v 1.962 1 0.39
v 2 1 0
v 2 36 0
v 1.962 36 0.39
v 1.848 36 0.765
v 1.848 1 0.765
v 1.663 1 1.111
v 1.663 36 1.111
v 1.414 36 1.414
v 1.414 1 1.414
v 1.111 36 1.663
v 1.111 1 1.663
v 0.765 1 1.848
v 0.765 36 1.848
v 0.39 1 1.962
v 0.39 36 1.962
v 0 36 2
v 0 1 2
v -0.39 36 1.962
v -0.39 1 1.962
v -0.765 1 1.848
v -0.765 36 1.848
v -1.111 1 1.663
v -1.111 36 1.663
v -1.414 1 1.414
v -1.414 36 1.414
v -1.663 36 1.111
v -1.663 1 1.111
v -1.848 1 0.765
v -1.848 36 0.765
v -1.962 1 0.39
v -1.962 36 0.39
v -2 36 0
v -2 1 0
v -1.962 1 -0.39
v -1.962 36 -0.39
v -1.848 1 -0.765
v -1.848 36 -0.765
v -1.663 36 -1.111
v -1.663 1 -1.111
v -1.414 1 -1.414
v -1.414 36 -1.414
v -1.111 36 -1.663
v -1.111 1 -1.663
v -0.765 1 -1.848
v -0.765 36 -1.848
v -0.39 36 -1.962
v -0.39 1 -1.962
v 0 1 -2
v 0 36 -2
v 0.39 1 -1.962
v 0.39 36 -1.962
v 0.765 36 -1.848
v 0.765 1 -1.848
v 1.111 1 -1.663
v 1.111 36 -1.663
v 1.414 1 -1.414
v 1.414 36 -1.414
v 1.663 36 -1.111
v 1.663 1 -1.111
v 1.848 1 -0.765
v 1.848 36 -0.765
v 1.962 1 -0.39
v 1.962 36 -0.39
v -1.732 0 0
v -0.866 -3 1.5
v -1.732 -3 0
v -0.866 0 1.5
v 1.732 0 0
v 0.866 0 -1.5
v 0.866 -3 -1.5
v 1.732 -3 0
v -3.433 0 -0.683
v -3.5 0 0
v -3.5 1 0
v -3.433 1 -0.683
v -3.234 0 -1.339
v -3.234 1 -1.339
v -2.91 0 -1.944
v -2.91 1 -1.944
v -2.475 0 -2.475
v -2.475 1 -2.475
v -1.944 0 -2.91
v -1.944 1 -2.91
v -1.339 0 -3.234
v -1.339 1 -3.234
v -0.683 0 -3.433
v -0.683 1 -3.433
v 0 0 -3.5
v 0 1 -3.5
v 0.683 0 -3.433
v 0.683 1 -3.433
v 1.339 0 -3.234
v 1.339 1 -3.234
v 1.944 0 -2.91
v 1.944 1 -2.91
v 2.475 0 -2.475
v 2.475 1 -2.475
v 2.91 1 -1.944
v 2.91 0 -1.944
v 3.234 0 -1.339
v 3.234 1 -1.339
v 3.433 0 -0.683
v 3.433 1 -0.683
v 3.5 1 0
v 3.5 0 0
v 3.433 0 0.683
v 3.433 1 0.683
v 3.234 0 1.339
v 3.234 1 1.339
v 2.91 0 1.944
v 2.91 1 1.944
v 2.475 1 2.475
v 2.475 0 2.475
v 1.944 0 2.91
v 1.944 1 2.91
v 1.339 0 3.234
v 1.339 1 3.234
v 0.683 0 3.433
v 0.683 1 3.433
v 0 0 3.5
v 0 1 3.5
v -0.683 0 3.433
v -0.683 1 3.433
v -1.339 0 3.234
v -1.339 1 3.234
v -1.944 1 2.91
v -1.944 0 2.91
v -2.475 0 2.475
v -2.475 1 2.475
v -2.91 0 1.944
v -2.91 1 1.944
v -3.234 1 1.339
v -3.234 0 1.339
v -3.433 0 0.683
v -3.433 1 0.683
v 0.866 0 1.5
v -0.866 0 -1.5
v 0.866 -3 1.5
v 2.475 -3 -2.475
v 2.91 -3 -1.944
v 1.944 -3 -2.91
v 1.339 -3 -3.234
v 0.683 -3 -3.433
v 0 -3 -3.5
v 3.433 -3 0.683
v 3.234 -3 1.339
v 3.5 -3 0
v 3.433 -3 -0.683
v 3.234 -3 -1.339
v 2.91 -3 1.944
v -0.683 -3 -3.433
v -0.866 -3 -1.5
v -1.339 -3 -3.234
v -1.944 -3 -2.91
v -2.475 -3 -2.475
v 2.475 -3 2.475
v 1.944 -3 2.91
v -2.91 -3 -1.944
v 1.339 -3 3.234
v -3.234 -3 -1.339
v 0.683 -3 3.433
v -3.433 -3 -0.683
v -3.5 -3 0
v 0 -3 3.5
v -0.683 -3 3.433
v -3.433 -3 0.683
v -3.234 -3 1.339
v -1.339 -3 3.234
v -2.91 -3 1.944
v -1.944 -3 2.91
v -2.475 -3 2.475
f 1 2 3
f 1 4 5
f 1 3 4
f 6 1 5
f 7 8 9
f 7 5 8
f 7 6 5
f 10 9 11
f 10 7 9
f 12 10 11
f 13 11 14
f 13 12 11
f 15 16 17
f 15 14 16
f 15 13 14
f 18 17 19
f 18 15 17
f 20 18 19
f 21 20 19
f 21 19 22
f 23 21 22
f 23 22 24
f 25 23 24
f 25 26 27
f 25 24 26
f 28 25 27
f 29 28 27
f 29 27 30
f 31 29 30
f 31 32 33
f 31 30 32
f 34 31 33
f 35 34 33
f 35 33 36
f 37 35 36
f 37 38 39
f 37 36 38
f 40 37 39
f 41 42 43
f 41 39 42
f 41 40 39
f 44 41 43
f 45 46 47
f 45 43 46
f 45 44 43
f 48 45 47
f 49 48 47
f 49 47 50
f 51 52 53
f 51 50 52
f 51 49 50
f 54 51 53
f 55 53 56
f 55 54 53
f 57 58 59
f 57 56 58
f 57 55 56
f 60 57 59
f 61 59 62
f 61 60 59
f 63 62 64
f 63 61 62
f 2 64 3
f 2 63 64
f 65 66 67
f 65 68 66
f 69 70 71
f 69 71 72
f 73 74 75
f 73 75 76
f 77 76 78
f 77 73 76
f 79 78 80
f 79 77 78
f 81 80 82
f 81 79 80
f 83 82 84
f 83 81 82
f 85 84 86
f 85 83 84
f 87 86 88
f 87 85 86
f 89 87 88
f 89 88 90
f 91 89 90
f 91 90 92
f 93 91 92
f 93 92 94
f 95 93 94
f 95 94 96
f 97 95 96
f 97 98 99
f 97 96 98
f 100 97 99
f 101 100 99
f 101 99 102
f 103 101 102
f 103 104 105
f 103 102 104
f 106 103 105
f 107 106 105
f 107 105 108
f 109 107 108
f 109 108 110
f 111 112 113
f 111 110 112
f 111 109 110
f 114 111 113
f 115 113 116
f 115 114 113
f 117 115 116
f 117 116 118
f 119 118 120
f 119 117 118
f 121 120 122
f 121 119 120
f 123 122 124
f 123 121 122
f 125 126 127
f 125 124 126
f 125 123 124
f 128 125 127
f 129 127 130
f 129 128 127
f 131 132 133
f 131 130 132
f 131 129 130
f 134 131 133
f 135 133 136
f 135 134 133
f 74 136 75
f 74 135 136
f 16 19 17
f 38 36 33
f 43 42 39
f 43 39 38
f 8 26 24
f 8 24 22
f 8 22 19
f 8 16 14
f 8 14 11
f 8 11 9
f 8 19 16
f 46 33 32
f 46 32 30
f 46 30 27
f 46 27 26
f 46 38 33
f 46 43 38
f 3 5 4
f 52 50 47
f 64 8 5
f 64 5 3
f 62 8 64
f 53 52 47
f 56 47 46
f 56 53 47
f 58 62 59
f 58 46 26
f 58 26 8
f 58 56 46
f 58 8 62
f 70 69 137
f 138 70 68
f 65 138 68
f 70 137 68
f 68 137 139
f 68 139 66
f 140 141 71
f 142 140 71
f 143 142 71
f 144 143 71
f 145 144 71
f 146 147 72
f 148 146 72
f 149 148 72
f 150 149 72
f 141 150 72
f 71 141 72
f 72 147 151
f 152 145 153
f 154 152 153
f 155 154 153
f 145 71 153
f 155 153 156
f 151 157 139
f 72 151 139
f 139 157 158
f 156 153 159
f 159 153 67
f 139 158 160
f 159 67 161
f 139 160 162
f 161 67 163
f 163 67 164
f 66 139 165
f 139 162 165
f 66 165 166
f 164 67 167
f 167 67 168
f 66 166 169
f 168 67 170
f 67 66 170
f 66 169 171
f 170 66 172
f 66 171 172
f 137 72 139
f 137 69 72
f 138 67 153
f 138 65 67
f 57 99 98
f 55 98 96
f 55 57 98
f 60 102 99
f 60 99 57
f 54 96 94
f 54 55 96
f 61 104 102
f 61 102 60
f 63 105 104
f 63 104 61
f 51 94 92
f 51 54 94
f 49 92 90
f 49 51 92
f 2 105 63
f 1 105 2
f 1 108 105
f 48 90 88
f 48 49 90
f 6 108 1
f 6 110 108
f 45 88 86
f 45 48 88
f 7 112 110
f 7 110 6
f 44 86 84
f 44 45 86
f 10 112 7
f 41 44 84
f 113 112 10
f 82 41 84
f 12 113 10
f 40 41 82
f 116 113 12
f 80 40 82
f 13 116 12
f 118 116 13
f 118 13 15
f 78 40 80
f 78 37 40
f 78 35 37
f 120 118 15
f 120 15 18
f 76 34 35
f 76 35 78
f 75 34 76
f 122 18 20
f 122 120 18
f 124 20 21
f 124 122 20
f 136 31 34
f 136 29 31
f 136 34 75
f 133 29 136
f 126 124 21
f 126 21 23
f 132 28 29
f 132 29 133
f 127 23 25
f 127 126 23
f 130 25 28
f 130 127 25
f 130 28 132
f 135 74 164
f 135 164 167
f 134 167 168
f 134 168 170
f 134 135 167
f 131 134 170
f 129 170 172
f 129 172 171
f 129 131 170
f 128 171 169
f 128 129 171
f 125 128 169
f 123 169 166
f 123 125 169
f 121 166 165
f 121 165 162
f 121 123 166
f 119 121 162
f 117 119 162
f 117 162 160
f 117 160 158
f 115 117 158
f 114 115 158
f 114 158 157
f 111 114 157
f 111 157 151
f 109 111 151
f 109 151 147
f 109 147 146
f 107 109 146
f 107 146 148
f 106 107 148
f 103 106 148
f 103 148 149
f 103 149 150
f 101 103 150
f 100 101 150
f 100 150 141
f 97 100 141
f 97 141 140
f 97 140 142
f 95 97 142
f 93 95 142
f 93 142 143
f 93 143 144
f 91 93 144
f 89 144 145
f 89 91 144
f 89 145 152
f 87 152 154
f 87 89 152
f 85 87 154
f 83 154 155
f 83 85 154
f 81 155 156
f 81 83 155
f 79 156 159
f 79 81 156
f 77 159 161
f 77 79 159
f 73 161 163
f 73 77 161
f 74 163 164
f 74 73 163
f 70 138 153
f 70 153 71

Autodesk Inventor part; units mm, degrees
ref_plane "YZ Plane" through (0, 0, 0) normal (1, 0, 0) x (0, 1, 0)
ref_plane "XZ Plane" through (0, 0, 0) normal (0, 1, 0) x (-1, 0, 0)
ref_plane "XY Plane" through (0, 0, 0) normal (0, 0, 1) x (1, 0, 0)
sketch "Szkic1" plane through (0, 0, 0) normal (0, 1, 0) x (-1, 0, 0)
  circle A0 centre (0, 0) radius 3.5
  line L0 (0.866, 1.5) -> (1.7321, 0)
  line L1 (1.7321, 0) -> (0.866, -1.5)
  line L2 (0.866, -1.5) -> (-0.866, -1.5)
  line L3 (-0.866, -1.5) -> (-1.7321, 0)
  line L4 (-1.7321, 0) -> (-0.866, 1.5)
  line L5 (-0.866, 1.5) -> (0.866, 1.5)
  circle A1 centre (0, 0) radius 2
  dimension "d0" = 7
  dimension "d1" = 3
  dimension "d12" = 4
extrude "Wyciągnięcie proste1" add sketch "Szkic1" along normal blind 1 contours A0 | L0 L1 L2 L3 L4 L5 | A1
extrude "Wyciągnięcie proste2" add sketch "Szkic1" against normal blind 3 contours A0 | A1
sketch "Szkic2" plane through (0, 1, 0) normal (0, 1, 0) x (1, 0, 0)
  circle A0 centre (0, 0) radius 2
  dimension "d7" = 4
extrude "Wyciągnięcie proste3" add sketch "Szkic2" along normal blind 35
thread "Gwint1" size "M4x0.7" class "6g" standard "ANSI Metric M Profile" length 65
properties part number "M4x35" material "Aluminum 6061"
